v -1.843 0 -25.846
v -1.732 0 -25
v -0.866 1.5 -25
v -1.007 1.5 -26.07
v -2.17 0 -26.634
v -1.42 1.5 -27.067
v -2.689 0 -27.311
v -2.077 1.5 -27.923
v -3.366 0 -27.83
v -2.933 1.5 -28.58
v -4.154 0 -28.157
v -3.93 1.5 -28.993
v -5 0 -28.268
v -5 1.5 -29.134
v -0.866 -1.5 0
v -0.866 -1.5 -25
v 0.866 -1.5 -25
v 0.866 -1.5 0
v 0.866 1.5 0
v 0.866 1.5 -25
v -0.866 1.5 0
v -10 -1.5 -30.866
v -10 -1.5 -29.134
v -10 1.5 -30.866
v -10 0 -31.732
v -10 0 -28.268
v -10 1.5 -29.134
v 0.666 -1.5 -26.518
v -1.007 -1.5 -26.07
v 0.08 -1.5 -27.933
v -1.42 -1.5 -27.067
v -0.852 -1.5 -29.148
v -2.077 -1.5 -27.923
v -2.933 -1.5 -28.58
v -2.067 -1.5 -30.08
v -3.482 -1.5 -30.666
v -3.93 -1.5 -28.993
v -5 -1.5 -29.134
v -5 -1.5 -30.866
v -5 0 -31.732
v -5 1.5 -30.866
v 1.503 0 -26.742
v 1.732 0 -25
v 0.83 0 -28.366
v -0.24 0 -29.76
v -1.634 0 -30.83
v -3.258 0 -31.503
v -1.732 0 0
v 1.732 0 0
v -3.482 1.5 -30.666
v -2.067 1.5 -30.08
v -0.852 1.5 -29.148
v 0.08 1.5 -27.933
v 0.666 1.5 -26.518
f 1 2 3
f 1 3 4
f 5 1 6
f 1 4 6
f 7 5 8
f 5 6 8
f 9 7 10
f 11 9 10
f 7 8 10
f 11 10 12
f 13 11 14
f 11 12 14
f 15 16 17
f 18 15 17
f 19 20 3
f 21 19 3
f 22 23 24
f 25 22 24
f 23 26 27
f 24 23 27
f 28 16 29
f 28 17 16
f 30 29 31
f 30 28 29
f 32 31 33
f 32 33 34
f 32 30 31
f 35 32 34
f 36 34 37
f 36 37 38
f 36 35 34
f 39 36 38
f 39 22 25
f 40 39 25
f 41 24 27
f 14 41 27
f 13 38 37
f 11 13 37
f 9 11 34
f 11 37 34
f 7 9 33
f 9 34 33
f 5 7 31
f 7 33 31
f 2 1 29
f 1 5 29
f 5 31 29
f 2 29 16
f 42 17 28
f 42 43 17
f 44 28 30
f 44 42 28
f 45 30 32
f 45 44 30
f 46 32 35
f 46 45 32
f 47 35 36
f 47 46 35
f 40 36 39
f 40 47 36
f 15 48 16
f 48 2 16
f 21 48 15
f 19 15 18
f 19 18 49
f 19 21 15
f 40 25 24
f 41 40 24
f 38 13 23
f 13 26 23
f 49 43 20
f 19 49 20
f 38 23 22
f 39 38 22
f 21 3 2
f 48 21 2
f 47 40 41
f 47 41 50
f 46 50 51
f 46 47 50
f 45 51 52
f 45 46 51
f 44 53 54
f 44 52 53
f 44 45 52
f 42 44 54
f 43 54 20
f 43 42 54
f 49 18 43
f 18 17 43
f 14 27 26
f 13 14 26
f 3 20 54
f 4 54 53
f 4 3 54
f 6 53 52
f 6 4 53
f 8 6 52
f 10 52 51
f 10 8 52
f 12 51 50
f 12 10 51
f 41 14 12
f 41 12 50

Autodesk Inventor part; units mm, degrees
ref_plane "YZ Plane" through (0, 0, 0) normal (1, 0, 0) x (0, 1, 0)
ref_plane "XZ Plane" through (0, 0, 0) normal (0, 1, 0) x (-1, 0, 0)
ref_plane "XY Plane" through (0, 0, 0) normal (0, 0, 1) x (1, 0, 0)
sketch "Esquisse1" plane through (0, 0, 0) normal (0, 0, 1) x (1, 0, 0)
  line L0 (0.866, -1.5) -> (-0.866, -1.5)
  line L1 (-0.866, -1.5) -> (-1.7321, 0)
  line L2 (-1.7321, 0) -> (-0.866, 1.5)
  line L3 (-0.866, 1.5) -> (0.866, 1.5)
  line L4 (0.866, 1.5) -> (1.7321, 0)
  line L5 (1.7321, 0) -> (0.866, -1.5)
  point P0 (0, 0)
  point P1 (0, 0)
  dimension "Taille" = 3
sketch "Esquisse2" plane through (0, 0, 0) normal (0, 1, 0) x (-1, 0, 0)
  line L0 (0, 0) -> (0, -25)
  line L1 (5, -30) -> (10, -30)
  arc A0 (0, -25) -> (5, -30) centre (5, -25) ccw
  point P0 (0, -30)
  dimension "Grand_longueur" = 30
  dimension "Petites_longueur" = 10
  dimension "COngé" = 5
sweep "Balayage1" add profiles "Esquisse1" path "Esquisse2"
equation "\"Grand_longueur\" = 10 * Taille"
equation "\"Petites_longueur\" = 0.333333 * Grand_longueur"
properties part number "1420-12 Cle btr-04" material "Acier inoxydable"
